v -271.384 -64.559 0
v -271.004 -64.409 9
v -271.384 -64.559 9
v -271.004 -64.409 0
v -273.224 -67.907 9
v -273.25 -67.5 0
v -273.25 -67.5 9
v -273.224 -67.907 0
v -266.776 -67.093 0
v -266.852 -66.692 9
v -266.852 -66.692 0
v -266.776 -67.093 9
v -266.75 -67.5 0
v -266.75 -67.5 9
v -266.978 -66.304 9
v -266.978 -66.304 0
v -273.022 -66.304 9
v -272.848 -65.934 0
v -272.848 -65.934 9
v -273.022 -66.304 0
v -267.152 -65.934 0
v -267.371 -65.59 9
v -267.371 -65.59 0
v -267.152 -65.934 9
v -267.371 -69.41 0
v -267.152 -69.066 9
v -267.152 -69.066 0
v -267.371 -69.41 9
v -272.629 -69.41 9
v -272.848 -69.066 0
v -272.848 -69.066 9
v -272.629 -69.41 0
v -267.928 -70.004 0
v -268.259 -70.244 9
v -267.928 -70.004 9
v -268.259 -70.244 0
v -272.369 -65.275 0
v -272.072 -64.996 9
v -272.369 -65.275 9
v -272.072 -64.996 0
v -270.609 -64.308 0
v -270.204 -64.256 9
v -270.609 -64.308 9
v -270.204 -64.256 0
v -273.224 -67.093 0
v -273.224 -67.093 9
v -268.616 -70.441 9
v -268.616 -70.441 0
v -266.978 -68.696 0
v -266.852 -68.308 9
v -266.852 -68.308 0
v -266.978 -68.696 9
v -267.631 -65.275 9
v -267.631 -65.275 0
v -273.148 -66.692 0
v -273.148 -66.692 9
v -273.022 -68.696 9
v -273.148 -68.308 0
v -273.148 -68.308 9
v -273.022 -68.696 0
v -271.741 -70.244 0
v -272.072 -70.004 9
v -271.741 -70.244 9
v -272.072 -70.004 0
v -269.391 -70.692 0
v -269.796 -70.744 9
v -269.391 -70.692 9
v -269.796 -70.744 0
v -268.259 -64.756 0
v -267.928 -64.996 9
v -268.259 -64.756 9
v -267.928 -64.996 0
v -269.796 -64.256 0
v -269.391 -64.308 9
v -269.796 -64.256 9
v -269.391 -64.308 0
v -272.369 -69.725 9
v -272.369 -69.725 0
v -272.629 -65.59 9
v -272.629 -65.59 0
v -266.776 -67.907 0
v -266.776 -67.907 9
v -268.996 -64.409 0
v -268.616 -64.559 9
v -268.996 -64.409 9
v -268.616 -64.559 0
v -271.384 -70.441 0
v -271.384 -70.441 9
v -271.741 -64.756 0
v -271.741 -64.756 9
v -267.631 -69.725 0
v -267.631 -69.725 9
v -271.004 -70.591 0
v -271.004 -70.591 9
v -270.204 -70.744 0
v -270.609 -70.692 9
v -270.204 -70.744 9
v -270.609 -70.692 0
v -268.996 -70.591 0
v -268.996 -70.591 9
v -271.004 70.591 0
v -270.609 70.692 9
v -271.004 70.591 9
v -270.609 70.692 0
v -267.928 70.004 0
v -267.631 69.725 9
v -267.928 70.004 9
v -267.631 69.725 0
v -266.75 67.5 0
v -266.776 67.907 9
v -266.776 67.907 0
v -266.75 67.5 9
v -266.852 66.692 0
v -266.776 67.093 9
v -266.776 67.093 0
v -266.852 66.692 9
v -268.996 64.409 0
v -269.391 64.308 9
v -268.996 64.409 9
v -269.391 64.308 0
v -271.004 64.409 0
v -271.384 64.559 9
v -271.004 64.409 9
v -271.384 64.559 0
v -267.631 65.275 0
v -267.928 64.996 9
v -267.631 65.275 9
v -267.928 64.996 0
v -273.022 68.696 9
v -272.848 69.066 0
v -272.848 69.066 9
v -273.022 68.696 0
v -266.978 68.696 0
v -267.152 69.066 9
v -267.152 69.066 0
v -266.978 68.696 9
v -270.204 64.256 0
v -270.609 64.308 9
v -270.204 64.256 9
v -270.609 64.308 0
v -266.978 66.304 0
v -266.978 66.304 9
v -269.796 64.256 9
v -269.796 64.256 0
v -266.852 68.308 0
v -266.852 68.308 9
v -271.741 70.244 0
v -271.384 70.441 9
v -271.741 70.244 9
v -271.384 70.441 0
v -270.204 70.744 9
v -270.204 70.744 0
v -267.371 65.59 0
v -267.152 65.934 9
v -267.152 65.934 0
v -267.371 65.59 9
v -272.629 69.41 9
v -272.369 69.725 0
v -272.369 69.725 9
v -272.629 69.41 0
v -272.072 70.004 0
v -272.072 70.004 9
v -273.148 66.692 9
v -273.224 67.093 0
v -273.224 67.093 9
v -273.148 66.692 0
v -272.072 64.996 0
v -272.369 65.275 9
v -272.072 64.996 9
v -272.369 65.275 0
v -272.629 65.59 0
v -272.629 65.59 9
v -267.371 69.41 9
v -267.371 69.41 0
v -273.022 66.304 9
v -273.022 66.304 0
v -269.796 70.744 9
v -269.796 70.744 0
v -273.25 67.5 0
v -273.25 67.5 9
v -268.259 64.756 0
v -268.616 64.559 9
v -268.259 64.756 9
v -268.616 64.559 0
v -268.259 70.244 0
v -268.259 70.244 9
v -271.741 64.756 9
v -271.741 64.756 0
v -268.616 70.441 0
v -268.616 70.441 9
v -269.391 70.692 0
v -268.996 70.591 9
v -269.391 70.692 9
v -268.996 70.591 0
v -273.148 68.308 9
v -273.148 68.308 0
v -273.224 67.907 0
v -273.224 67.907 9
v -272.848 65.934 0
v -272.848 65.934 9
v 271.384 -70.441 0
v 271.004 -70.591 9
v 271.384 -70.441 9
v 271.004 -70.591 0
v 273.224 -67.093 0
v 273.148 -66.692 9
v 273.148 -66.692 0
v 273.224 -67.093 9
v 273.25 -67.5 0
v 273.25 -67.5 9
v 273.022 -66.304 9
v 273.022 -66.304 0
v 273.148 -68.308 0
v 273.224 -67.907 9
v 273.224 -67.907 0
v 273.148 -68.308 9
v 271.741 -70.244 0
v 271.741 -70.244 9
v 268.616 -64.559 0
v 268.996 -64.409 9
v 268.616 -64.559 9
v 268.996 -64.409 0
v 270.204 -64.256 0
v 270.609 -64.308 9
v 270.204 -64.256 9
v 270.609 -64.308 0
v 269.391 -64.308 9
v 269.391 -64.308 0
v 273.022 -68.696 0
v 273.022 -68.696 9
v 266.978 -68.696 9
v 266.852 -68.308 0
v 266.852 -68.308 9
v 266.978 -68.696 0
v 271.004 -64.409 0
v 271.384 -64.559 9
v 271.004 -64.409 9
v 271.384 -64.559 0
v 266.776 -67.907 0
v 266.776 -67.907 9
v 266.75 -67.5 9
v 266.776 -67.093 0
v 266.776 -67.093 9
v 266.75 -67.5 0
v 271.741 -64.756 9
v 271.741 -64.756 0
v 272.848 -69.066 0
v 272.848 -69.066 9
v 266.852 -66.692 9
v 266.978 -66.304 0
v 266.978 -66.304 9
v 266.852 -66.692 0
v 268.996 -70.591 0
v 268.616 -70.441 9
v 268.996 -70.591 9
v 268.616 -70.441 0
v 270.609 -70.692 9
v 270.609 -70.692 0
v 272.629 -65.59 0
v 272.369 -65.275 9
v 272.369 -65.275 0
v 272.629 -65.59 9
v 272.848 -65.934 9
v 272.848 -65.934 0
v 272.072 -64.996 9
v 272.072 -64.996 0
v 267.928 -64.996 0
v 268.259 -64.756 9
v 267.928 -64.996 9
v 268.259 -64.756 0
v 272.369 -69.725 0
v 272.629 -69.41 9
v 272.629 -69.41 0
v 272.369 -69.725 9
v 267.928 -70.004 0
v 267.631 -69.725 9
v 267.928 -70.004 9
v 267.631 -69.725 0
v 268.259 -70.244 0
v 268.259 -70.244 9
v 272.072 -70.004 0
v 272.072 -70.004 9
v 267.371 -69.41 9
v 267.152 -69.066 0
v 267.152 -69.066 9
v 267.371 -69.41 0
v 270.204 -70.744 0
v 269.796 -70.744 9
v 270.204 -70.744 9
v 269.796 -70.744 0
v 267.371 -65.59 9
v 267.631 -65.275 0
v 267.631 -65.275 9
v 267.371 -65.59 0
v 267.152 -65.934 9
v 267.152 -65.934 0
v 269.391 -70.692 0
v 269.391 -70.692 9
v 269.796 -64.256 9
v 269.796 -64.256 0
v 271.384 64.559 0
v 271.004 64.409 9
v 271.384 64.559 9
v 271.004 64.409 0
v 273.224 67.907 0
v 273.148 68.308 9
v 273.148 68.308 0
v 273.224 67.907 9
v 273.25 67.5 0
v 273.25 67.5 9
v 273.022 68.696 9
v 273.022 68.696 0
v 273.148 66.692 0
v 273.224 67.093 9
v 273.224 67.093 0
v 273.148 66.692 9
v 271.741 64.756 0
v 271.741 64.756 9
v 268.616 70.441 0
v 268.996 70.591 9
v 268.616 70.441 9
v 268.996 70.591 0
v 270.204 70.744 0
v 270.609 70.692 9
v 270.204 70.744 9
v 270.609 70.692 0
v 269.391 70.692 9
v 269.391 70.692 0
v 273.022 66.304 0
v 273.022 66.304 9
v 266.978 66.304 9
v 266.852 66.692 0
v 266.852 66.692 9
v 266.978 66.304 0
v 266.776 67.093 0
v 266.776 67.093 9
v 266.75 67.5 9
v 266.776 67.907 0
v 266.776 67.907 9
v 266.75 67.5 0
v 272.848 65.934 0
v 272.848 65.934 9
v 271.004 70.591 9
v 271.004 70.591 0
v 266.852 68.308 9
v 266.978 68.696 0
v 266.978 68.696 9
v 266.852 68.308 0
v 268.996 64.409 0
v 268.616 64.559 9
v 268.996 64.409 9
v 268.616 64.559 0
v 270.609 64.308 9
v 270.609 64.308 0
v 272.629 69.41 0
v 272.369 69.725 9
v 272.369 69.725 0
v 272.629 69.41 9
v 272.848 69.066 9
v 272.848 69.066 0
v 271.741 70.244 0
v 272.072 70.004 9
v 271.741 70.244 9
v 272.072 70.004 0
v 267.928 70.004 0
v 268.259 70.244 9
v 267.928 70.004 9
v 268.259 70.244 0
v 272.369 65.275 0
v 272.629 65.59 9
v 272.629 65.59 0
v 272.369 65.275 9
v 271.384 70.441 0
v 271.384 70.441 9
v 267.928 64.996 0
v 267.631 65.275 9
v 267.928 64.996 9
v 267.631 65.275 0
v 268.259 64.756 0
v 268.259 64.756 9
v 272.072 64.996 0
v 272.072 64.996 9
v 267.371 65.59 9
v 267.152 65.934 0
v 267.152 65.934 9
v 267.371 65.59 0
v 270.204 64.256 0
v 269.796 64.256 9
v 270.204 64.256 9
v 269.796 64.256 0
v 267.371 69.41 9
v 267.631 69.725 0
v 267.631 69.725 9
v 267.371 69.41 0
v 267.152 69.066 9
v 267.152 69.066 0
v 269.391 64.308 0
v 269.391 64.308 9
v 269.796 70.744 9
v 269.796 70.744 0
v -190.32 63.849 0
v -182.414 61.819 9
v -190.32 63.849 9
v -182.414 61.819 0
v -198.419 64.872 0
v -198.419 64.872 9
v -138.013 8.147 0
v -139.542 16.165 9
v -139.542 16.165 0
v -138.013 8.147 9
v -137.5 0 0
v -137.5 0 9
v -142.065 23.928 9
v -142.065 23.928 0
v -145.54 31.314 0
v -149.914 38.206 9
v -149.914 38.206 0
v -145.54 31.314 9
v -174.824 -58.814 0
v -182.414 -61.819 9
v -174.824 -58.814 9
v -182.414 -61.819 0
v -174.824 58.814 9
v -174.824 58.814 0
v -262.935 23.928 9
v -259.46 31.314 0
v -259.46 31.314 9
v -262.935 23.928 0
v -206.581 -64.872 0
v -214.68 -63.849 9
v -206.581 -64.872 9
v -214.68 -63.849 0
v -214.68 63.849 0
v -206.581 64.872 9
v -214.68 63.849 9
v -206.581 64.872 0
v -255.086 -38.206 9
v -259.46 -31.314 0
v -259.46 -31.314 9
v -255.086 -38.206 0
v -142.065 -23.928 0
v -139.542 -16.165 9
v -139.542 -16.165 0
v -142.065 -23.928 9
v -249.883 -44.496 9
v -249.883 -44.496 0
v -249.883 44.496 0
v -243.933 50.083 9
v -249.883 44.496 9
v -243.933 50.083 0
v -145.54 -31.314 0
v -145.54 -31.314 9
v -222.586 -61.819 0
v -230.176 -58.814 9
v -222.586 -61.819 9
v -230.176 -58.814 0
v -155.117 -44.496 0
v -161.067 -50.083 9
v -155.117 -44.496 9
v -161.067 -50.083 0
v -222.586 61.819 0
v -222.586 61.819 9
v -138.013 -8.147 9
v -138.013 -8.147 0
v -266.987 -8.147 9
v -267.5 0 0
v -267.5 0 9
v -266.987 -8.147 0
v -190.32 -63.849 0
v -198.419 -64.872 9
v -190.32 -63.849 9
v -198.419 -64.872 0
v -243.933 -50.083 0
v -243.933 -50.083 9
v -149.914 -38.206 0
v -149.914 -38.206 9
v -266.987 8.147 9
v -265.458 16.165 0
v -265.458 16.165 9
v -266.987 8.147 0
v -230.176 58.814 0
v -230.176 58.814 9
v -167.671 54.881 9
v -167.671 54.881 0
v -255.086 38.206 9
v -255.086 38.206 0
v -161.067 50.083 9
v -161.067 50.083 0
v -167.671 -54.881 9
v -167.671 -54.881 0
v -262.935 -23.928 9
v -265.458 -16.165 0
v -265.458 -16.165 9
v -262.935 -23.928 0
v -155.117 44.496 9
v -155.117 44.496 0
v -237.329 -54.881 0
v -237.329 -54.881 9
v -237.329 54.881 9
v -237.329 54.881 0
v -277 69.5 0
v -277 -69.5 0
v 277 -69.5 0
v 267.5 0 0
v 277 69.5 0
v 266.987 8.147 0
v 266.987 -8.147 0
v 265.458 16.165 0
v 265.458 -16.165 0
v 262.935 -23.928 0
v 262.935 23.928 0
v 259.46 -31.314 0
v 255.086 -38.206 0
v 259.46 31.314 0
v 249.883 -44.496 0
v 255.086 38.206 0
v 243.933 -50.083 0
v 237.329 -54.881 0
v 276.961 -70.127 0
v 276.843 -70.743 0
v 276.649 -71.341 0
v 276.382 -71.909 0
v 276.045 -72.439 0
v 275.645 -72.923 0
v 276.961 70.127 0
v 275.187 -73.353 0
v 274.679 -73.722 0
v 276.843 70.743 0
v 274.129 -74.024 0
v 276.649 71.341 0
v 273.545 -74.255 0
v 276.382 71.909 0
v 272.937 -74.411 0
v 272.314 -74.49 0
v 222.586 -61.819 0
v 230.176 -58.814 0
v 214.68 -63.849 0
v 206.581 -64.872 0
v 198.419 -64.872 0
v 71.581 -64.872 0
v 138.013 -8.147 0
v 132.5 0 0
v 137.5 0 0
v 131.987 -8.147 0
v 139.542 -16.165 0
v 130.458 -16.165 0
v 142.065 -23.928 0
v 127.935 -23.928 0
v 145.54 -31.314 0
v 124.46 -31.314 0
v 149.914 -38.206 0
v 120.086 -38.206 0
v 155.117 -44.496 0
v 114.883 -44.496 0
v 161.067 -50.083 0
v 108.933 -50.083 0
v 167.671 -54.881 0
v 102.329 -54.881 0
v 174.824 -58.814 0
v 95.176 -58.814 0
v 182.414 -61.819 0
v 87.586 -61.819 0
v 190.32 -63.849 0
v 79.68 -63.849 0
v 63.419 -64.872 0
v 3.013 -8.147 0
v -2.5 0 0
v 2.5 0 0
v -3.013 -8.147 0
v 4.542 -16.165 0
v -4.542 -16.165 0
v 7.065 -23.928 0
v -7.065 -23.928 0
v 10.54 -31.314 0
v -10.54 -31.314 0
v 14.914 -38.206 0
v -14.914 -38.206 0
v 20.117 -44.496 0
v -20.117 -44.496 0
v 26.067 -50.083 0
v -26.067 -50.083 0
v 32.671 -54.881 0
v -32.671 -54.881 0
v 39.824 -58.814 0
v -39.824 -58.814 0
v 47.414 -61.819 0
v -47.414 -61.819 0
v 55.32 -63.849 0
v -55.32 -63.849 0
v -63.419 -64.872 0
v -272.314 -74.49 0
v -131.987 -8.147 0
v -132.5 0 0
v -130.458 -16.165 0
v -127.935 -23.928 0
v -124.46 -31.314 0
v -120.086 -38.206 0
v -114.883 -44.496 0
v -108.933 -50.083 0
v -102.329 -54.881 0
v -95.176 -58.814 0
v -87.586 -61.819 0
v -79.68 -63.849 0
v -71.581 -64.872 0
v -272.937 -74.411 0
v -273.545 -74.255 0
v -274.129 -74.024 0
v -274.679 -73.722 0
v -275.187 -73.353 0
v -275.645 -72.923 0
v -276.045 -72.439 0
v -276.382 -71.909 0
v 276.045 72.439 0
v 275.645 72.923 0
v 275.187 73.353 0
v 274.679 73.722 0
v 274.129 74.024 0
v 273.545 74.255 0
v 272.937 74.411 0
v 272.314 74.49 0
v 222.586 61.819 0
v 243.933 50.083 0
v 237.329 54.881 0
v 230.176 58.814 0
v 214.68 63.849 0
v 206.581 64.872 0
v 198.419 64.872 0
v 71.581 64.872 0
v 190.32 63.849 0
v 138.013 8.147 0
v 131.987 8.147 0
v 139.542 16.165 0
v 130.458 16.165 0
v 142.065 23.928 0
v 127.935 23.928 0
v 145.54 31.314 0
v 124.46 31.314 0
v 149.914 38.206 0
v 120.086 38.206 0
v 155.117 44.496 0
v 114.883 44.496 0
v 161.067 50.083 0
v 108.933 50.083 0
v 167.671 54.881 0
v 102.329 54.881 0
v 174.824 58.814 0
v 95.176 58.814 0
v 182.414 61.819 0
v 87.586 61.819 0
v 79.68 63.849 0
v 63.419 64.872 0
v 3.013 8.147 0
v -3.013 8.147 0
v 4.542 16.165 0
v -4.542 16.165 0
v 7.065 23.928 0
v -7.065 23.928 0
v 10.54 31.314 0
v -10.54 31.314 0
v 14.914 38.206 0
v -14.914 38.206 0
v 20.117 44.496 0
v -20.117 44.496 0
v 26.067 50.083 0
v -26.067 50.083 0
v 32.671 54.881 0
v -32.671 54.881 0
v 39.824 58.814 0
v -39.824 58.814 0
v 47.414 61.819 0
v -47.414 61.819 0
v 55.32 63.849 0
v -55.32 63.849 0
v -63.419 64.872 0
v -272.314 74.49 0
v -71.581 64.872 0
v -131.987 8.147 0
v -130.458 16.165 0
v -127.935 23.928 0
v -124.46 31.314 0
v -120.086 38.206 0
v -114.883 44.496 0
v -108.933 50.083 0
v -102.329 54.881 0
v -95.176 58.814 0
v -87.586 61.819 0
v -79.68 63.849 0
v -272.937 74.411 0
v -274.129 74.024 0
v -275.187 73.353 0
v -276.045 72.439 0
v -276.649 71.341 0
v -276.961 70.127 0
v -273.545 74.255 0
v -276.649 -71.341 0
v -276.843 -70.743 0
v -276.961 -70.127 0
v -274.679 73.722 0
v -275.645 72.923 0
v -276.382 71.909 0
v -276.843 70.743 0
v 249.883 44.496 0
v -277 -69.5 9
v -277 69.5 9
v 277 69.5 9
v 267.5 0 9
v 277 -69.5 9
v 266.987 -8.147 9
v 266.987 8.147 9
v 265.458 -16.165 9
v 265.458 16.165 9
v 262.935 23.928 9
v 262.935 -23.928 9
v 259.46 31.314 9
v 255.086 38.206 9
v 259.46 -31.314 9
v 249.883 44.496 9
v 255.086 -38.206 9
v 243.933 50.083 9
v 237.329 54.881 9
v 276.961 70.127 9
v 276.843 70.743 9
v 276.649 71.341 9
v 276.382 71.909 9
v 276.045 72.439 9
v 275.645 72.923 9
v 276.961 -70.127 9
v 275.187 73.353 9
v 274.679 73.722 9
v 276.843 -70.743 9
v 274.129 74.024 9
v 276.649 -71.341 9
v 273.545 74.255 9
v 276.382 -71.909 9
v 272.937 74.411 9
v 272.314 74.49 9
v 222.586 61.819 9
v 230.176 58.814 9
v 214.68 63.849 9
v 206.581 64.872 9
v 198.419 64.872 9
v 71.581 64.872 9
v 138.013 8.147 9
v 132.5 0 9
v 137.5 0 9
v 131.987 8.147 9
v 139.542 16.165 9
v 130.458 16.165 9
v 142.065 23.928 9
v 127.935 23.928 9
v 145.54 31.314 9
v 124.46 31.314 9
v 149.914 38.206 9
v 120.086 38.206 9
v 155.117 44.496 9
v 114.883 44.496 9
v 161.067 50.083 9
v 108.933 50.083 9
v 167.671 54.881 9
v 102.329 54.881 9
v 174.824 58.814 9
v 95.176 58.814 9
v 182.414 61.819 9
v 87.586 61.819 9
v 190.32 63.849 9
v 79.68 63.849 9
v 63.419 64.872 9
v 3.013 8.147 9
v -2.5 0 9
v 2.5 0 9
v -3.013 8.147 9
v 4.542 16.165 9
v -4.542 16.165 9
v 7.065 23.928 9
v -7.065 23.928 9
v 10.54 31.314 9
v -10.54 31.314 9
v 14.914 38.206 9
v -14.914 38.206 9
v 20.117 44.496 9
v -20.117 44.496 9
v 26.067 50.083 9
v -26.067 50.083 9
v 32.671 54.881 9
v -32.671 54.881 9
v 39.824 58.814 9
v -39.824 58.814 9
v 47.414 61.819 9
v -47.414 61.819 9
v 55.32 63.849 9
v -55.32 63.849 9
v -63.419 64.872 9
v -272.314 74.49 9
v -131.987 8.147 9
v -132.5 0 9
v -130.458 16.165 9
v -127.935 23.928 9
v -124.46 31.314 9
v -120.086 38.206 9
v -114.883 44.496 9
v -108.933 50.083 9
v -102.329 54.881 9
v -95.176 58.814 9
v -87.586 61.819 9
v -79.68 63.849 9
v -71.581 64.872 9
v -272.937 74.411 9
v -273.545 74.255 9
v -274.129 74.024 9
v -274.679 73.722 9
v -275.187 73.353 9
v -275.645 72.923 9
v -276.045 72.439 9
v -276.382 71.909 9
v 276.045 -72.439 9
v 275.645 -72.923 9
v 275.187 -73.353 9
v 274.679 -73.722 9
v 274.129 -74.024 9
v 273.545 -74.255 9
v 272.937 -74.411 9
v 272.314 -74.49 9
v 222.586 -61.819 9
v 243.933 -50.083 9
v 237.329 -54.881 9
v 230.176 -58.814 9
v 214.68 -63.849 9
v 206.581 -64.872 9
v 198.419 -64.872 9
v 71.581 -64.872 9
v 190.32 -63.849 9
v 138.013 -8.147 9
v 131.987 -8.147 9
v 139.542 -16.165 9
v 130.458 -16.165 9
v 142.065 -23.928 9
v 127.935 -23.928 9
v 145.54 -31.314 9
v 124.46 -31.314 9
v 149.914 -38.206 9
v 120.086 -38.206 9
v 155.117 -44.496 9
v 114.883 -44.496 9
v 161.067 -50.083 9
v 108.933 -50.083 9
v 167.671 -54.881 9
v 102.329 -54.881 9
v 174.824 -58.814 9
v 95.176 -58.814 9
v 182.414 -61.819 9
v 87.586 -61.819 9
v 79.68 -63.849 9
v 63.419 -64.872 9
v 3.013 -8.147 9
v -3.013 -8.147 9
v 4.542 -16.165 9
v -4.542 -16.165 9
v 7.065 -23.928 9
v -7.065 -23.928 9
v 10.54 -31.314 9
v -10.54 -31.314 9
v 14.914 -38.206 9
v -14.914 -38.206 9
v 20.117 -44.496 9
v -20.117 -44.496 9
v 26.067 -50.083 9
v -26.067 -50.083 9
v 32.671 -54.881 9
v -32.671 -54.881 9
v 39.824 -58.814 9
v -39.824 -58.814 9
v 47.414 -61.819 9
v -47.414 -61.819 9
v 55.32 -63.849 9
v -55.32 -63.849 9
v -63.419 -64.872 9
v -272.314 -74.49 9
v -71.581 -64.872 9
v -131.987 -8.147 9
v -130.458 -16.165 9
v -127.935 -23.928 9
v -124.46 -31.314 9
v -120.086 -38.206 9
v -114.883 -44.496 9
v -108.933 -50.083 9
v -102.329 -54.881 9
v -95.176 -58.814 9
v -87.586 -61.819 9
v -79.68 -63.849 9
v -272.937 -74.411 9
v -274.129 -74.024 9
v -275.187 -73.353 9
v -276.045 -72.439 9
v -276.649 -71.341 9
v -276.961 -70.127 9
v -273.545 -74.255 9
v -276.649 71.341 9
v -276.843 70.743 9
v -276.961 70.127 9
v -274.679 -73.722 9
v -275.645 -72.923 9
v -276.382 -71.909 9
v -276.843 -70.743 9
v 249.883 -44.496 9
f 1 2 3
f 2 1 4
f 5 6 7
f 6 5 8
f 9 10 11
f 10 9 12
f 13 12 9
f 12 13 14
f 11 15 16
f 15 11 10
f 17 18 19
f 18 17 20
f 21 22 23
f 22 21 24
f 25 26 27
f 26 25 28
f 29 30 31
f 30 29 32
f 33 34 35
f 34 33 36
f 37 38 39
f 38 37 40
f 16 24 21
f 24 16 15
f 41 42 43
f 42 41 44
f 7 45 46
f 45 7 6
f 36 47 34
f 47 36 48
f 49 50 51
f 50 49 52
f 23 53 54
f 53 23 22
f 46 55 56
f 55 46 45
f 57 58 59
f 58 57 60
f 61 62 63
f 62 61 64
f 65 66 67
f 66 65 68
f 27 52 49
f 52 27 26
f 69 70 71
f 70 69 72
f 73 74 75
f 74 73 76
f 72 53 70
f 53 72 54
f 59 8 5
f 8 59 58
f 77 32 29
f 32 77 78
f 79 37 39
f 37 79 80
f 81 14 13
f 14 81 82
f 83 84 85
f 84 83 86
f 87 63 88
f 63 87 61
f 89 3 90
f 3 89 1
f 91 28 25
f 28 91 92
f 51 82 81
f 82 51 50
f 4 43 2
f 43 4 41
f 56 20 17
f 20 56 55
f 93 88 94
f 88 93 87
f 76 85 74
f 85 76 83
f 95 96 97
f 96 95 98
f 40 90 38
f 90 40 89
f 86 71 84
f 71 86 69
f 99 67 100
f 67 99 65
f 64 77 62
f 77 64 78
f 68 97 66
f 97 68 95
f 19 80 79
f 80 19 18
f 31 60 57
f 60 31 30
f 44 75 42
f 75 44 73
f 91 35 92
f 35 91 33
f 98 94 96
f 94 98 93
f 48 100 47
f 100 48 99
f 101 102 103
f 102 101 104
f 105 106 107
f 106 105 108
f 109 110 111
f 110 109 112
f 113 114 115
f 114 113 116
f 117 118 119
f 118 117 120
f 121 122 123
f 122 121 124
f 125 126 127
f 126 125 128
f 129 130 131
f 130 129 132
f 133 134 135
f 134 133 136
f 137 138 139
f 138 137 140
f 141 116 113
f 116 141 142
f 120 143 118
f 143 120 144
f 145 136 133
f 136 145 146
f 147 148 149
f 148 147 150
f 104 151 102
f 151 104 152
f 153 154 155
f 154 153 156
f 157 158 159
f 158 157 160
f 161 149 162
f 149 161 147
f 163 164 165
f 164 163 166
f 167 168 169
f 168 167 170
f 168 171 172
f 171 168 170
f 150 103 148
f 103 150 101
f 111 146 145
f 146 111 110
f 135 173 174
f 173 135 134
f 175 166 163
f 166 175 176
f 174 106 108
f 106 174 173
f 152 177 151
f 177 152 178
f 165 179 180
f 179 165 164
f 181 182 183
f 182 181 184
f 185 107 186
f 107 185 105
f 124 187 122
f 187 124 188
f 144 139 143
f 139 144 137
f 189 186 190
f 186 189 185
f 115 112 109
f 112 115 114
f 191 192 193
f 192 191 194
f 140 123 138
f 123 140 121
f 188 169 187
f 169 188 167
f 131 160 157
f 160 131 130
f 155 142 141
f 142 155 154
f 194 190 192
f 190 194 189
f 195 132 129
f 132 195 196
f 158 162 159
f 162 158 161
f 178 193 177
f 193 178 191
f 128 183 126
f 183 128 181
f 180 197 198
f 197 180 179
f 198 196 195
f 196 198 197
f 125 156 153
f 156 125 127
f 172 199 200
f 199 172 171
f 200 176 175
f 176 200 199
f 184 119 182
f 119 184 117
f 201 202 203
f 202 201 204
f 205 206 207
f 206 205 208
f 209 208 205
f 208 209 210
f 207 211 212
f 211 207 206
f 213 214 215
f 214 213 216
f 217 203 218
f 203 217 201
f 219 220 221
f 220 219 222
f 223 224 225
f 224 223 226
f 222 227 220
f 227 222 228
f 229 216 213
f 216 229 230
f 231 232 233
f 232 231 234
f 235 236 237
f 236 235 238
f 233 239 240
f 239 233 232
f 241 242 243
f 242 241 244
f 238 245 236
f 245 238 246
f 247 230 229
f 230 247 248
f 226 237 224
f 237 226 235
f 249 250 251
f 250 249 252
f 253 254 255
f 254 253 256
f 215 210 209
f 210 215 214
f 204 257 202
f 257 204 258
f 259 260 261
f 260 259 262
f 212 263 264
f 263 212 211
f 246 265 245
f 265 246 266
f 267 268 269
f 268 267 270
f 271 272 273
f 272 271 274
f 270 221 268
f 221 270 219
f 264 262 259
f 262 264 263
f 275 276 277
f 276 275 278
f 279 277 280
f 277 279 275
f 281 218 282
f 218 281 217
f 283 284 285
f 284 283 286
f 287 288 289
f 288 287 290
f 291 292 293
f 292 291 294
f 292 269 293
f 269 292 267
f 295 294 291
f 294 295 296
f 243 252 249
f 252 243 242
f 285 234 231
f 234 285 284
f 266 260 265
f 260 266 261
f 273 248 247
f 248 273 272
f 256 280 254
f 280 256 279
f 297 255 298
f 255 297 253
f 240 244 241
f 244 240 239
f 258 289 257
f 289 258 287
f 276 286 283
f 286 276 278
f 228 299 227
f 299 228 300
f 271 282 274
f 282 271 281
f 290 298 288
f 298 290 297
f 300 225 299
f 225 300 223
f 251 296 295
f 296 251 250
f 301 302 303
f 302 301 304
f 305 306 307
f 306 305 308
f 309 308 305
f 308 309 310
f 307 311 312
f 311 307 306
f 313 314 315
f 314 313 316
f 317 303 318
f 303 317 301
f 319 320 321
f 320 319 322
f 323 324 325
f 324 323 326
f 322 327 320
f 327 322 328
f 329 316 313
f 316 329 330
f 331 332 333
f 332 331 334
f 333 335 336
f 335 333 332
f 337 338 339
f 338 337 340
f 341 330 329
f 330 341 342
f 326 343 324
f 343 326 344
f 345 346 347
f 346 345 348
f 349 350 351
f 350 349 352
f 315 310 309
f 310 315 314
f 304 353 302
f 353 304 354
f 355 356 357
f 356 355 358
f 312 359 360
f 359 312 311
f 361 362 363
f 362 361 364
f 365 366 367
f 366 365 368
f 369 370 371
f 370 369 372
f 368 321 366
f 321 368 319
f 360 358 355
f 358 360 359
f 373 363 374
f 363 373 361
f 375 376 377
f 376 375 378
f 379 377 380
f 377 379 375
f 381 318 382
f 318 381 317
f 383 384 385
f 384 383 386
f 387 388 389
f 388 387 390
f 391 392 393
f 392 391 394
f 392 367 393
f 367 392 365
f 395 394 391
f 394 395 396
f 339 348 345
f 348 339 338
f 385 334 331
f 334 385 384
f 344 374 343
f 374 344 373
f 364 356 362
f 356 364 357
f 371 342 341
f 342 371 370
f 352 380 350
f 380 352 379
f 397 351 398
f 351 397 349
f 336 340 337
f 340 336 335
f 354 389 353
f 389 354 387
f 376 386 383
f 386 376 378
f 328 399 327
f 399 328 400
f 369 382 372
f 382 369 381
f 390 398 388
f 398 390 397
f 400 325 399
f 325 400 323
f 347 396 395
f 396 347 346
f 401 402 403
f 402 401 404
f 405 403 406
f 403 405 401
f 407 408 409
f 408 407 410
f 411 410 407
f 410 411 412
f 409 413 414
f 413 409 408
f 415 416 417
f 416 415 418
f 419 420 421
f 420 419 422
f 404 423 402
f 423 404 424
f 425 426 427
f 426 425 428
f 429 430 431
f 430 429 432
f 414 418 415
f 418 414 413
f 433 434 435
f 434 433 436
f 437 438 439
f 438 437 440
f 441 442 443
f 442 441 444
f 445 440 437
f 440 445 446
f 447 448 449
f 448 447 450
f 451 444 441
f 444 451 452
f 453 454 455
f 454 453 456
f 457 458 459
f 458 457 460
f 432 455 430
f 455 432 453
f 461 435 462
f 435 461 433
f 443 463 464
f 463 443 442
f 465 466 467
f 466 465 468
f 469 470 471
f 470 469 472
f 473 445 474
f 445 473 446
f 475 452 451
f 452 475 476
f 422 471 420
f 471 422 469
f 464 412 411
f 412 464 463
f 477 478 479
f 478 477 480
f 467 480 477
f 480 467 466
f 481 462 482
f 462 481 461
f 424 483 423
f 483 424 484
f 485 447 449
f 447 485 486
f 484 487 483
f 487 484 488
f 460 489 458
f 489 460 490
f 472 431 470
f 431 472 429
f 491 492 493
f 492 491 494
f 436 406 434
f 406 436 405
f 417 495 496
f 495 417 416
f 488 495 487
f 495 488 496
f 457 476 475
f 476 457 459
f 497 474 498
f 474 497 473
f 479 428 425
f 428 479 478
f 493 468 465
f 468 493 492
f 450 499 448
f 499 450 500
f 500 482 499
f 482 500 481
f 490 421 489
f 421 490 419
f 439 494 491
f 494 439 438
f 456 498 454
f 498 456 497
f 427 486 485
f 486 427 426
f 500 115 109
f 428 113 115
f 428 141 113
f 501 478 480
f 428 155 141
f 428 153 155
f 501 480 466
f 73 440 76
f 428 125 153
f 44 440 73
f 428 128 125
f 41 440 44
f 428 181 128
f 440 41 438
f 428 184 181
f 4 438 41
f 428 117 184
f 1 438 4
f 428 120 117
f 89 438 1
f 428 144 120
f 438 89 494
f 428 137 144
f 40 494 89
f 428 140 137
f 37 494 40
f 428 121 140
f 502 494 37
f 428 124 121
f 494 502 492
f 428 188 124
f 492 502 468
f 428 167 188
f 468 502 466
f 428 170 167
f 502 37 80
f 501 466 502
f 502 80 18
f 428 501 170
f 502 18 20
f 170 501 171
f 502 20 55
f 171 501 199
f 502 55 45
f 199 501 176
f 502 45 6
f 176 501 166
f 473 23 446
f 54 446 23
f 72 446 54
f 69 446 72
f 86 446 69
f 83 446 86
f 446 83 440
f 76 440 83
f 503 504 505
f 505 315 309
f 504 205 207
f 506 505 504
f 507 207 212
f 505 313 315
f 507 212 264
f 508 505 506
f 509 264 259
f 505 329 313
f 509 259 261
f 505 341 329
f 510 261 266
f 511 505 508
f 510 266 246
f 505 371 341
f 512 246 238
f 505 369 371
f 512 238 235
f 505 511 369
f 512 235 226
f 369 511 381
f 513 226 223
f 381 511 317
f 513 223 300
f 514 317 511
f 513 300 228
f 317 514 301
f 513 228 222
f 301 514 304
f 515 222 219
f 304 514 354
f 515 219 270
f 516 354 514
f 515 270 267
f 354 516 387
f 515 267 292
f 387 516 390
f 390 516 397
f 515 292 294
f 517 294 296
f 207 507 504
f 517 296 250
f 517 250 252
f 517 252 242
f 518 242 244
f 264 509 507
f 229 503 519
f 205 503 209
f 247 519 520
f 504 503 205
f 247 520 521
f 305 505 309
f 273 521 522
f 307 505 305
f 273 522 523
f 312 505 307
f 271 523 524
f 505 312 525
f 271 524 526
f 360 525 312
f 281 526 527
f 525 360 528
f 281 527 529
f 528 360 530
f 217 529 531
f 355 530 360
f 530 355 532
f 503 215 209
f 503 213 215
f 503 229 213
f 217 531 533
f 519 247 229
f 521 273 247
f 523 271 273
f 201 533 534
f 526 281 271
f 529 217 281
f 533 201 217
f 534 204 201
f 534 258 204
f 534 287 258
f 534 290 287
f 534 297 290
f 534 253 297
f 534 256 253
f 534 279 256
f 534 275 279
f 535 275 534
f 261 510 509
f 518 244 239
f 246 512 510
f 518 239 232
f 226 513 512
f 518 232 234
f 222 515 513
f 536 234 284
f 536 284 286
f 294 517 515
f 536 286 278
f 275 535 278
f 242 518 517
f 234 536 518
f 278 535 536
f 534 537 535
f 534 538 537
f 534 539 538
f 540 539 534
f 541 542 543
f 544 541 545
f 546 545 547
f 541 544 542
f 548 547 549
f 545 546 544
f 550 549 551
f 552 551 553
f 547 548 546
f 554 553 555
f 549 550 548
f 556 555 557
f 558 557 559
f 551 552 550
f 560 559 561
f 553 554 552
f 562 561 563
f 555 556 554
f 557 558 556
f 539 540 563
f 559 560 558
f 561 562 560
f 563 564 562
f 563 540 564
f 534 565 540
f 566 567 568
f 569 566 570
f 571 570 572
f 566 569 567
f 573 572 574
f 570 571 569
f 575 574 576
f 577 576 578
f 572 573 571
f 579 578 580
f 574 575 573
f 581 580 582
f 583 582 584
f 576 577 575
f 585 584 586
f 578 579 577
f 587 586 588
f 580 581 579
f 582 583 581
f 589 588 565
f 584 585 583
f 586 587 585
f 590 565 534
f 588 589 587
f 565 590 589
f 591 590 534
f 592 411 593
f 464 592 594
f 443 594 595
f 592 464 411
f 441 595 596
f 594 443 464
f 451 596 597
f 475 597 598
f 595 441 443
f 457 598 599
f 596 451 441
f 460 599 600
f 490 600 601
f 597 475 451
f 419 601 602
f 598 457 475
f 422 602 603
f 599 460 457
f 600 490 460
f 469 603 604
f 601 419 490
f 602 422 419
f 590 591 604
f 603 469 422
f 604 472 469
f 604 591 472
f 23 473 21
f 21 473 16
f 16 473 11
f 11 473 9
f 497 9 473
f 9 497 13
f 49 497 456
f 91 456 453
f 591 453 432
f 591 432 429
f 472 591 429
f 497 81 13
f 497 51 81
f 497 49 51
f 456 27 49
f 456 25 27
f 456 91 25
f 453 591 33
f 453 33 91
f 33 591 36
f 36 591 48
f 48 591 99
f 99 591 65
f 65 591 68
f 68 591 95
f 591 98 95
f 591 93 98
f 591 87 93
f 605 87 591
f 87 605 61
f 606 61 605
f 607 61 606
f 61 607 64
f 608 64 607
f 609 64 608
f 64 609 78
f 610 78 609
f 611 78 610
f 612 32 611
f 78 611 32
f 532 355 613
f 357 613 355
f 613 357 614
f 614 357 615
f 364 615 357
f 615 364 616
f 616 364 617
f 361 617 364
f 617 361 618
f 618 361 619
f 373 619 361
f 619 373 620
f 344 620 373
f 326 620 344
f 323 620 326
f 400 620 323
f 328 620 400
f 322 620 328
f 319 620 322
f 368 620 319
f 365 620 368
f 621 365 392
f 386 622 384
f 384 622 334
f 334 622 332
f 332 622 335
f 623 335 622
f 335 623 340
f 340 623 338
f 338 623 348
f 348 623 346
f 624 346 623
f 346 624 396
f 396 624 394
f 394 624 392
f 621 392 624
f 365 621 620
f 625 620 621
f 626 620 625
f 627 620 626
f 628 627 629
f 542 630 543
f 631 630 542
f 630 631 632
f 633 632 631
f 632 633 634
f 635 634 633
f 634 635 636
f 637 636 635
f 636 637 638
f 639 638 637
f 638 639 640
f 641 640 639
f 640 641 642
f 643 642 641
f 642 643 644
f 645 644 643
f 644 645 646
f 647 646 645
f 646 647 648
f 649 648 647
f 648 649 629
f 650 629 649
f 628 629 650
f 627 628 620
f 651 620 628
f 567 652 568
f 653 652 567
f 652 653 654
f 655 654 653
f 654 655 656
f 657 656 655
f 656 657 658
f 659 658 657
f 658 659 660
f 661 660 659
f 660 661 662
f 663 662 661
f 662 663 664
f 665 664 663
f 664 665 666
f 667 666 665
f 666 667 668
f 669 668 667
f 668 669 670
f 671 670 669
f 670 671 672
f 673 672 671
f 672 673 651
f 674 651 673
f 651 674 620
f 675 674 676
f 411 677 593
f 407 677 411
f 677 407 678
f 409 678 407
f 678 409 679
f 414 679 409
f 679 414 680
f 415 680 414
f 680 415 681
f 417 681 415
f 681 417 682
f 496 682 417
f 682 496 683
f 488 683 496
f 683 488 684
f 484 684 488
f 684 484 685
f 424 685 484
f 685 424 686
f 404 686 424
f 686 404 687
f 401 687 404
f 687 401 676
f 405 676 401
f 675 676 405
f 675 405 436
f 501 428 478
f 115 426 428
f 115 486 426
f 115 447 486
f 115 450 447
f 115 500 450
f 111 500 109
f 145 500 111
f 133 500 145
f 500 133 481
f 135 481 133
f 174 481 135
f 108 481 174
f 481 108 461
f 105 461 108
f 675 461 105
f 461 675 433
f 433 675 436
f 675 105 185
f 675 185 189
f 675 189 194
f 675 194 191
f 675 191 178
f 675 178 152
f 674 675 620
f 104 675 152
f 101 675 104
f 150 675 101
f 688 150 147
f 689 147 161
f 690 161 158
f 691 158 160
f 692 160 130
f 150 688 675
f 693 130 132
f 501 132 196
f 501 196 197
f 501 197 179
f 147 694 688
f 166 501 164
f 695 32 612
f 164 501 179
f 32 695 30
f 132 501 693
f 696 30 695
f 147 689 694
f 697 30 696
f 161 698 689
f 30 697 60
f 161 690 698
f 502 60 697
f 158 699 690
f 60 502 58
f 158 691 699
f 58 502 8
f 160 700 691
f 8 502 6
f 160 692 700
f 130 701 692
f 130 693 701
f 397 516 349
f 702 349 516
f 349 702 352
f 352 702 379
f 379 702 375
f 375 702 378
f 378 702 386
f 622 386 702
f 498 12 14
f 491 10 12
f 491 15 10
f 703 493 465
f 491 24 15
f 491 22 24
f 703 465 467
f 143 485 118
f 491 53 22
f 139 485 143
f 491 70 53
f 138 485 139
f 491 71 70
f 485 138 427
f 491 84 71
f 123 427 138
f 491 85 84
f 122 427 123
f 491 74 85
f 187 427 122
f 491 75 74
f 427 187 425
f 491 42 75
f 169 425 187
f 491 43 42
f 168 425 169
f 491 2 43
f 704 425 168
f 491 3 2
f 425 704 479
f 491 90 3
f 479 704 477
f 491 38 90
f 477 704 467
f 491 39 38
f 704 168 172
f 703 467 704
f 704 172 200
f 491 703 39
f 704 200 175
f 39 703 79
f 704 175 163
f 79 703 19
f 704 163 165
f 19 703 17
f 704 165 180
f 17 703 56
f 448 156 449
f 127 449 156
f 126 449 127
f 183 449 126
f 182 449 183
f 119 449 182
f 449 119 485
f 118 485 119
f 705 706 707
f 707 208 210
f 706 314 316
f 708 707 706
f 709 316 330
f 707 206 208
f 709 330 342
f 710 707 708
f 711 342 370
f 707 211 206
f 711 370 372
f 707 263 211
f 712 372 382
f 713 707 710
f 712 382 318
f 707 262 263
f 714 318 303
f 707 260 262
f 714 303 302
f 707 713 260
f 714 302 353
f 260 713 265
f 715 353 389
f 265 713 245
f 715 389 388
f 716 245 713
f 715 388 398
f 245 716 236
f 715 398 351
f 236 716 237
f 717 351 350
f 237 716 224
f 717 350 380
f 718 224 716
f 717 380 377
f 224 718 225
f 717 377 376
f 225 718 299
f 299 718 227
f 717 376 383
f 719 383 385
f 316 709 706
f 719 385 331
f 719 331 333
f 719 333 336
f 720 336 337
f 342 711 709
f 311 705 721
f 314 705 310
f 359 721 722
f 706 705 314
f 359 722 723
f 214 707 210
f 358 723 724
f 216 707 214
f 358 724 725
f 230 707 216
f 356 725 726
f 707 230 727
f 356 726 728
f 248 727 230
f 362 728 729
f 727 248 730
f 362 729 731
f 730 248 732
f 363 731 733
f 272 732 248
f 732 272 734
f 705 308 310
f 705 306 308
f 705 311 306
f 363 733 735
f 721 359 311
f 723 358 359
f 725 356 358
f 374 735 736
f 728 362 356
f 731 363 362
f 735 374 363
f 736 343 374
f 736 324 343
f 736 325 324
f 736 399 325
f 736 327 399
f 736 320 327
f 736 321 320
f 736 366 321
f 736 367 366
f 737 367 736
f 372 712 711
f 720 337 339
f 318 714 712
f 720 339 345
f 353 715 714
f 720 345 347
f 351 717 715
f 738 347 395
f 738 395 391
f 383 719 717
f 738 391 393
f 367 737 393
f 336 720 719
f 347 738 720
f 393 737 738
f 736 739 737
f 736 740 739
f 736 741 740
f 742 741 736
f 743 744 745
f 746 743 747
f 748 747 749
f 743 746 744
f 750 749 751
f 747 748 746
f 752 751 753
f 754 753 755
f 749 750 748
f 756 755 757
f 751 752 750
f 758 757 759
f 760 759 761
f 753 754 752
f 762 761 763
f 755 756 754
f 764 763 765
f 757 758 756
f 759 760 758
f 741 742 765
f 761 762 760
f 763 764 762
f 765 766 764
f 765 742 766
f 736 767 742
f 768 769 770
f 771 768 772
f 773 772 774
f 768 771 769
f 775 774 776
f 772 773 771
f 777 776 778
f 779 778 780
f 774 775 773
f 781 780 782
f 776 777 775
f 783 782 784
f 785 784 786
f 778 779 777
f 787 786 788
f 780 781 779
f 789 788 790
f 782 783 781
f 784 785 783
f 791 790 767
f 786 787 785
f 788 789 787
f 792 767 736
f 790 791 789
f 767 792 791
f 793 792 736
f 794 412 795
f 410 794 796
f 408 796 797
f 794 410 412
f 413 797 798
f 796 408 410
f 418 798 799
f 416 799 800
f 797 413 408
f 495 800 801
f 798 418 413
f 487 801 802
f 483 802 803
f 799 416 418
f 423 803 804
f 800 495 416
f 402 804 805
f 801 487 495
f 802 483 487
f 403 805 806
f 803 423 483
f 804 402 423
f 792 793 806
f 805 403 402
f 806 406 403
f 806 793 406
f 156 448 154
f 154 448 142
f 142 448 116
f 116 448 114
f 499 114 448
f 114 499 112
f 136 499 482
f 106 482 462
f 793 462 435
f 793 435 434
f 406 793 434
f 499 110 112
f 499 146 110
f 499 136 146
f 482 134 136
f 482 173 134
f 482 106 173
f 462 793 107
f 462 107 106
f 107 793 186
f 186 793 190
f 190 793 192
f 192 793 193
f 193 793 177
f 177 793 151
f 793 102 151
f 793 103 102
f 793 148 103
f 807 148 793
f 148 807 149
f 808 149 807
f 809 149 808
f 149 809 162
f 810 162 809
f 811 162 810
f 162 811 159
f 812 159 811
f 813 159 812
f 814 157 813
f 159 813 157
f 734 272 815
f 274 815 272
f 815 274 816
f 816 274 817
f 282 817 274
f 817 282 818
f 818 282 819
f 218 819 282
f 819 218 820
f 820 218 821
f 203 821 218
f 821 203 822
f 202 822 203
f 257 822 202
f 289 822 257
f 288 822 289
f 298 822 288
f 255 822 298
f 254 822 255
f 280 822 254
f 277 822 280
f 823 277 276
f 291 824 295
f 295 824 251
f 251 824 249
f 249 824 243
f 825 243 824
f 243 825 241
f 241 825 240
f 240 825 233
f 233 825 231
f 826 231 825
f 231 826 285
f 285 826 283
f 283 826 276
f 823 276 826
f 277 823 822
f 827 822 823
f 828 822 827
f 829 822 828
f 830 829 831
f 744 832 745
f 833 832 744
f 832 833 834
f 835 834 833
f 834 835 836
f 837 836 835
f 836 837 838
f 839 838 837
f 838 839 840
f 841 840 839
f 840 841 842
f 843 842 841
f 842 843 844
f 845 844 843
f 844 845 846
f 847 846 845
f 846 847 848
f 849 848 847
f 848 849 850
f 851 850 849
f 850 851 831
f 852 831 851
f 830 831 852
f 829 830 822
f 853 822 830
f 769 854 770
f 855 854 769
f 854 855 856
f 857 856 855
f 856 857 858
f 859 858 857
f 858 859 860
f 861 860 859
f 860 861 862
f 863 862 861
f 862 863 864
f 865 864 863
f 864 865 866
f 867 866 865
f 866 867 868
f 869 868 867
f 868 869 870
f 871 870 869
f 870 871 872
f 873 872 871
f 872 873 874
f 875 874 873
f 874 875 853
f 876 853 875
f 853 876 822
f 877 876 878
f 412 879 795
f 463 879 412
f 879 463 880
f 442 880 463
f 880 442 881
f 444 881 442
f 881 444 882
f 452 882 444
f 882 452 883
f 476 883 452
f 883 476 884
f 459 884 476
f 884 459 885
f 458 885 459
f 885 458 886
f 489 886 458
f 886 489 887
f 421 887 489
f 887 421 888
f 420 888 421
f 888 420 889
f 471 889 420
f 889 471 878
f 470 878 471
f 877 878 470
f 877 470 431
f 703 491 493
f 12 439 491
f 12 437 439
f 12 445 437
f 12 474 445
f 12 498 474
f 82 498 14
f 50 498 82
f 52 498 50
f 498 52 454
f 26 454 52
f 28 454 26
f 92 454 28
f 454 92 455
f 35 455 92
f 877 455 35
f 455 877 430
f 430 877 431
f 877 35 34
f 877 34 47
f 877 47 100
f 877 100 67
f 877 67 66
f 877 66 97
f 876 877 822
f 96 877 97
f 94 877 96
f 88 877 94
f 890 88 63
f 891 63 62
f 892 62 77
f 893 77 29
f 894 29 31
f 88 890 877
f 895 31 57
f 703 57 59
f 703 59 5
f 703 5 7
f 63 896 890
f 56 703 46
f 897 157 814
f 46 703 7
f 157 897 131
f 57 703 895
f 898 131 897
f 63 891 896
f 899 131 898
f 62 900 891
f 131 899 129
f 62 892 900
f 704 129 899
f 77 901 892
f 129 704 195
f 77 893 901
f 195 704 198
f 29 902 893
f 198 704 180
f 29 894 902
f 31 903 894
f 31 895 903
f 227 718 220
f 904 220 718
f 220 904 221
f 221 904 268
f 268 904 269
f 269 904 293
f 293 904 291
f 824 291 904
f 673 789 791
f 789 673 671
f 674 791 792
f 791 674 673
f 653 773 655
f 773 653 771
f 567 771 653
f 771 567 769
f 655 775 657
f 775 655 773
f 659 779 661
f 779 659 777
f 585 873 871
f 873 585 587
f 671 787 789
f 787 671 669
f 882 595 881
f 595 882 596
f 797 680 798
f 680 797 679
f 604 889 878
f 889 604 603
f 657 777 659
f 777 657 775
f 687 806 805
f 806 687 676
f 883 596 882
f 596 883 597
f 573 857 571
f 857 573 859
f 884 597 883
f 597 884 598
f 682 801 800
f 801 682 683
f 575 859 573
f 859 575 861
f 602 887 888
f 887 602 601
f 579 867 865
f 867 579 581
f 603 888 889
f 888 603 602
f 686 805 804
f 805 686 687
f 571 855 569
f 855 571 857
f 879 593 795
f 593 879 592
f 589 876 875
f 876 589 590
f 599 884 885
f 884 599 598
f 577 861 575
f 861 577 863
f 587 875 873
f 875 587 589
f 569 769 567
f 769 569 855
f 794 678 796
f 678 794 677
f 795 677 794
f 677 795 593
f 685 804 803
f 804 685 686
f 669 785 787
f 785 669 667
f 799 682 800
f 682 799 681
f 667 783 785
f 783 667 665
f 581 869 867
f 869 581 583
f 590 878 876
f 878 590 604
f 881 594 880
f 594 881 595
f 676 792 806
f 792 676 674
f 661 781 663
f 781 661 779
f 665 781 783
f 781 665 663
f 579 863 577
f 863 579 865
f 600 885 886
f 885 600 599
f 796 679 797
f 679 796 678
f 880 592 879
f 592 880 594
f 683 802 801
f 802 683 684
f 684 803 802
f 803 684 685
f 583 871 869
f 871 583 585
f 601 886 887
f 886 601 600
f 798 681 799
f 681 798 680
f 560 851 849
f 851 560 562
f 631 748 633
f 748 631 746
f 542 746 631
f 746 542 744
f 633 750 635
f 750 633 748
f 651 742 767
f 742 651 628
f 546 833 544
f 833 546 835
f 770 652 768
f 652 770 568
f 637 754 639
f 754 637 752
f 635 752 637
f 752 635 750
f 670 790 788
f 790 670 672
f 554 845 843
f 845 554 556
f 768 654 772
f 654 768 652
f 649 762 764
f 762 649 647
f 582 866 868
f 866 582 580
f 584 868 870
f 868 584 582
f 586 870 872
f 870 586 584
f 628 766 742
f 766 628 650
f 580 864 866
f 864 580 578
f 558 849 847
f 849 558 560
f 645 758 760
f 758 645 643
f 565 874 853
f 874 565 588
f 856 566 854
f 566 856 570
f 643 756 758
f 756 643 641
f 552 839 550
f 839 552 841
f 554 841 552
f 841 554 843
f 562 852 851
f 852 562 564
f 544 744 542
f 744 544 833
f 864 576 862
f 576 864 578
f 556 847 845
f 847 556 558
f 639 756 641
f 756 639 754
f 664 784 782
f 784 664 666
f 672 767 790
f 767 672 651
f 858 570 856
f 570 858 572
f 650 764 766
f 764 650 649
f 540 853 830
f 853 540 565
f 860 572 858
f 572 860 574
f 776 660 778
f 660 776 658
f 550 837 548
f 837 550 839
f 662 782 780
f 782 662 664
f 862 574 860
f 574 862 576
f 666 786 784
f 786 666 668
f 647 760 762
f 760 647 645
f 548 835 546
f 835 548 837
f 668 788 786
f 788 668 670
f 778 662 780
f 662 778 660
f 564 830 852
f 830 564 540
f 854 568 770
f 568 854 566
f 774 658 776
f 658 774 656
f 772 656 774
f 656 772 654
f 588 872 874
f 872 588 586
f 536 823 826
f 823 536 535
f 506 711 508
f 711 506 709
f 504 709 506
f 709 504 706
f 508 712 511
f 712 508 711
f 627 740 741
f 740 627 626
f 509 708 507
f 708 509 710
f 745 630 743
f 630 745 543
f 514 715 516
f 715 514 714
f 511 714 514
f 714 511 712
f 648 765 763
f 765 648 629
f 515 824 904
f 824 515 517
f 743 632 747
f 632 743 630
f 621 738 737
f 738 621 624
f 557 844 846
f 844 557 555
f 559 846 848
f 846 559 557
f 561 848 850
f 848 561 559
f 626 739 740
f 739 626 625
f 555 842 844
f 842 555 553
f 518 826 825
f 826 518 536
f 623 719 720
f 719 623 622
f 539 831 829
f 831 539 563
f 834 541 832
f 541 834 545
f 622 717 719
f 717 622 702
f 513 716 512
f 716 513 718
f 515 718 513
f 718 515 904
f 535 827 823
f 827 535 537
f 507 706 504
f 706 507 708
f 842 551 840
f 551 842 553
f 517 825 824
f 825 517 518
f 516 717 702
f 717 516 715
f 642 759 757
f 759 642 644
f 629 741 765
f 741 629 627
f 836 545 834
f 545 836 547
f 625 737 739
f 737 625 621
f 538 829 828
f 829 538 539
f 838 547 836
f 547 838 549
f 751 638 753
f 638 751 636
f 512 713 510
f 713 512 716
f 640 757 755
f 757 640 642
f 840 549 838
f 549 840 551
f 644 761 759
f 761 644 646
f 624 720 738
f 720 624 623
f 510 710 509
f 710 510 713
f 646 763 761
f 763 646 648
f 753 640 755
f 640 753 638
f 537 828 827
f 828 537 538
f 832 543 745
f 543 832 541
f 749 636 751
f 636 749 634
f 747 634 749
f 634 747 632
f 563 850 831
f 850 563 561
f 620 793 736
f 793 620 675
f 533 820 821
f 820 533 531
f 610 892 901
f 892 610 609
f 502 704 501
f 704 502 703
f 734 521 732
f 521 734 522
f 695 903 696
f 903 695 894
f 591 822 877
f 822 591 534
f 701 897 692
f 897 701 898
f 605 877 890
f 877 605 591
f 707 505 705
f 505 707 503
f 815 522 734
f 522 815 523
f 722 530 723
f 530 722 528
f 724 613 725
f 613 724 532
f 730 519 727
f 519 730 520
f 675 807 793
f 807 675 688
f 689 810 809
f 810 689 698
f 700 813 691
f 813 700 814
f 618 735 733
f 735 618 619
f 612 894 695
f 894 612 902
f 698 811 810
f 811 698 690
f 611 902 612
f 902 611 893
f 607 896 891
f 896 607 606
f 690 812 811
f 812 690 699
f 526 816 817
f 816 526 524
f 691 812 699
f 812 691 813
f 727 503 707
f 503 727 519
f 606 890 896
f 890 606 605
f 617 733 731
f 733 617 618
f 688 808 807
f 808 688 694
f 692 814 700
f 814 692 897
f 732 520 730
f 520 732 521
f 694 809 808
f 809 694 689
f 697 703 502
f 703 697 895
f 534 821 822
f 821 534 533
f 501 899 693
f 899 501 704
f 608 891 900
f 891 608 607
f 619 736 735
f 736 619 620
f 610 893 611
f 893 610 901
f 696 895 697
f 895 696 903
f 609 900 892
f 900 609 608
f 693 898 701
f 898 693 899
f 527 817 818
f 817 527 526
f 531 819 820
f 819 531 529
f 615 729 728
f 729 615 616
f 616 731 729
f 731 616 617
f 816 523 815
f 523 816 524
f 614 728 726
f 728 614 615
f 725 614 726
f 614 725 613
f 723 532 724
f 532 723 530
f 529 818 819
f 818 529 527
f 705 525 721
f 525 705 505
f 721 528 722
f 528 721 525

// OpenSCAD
$fn = 50;


difference() {
	union() {
		hull() {
			translate(v = [-272.0000000000, 69.5000000000, 0]) {
				cylinder(h = 9, r = 5);
			}
			translate(v = [272.0000000000, 69.5000000000, 0]) {
				cylinder(h = 9, r = 5);
			}
			translate(v = [-272.0000000000, -69.5000000000, 0]) {
				cylinder(h = 9, r = 5);
			}
			translate(v = [272.0000000000, -69.5000000000, 0]) {
				cylinder(h = 9, r = 5);
			}
		}
	}
	union() {
		#translate(v = [-270.0000000000, -67.5000000000, -100.0000000000]) {
			cylinder(h = 200, r = 3.2500000000);
		}
		#translate(v = [-270.0000000000, 67.5000000000, -100.0000000000]) {
			cylinder(h = 200, r = 3.2500000000);
		}
		#translate(v = [270.0000000000, -67.5000000000, -100.0000000000]) {
			cylinder(h = 200, r = 3.2500000000);
		}
		#translate(v = [270.0000000000, 67.5000000000, -100.0000000000]) {
			cylinder(h = 200, r = 3.2500000000);
		}
		#translate(v = [-202.5000000000, 0, 0]) {
			cylinder(h = 9, r = 65.0000000000);
		}
		#translate(v = [-67.5000000000, 0, 0]) {
			cylinder(h = 9, r = 65.0000000000);
		}
		#translate(v = [67.5000000000, 0, 0]) {
			cylinder(h = 9, r = 65.0000000000);
		}
		#translate(v = [202.5000000000, 0, 0]) {
			cylinder(h = 9, r = 65.0000000000);
		}
	}
}
